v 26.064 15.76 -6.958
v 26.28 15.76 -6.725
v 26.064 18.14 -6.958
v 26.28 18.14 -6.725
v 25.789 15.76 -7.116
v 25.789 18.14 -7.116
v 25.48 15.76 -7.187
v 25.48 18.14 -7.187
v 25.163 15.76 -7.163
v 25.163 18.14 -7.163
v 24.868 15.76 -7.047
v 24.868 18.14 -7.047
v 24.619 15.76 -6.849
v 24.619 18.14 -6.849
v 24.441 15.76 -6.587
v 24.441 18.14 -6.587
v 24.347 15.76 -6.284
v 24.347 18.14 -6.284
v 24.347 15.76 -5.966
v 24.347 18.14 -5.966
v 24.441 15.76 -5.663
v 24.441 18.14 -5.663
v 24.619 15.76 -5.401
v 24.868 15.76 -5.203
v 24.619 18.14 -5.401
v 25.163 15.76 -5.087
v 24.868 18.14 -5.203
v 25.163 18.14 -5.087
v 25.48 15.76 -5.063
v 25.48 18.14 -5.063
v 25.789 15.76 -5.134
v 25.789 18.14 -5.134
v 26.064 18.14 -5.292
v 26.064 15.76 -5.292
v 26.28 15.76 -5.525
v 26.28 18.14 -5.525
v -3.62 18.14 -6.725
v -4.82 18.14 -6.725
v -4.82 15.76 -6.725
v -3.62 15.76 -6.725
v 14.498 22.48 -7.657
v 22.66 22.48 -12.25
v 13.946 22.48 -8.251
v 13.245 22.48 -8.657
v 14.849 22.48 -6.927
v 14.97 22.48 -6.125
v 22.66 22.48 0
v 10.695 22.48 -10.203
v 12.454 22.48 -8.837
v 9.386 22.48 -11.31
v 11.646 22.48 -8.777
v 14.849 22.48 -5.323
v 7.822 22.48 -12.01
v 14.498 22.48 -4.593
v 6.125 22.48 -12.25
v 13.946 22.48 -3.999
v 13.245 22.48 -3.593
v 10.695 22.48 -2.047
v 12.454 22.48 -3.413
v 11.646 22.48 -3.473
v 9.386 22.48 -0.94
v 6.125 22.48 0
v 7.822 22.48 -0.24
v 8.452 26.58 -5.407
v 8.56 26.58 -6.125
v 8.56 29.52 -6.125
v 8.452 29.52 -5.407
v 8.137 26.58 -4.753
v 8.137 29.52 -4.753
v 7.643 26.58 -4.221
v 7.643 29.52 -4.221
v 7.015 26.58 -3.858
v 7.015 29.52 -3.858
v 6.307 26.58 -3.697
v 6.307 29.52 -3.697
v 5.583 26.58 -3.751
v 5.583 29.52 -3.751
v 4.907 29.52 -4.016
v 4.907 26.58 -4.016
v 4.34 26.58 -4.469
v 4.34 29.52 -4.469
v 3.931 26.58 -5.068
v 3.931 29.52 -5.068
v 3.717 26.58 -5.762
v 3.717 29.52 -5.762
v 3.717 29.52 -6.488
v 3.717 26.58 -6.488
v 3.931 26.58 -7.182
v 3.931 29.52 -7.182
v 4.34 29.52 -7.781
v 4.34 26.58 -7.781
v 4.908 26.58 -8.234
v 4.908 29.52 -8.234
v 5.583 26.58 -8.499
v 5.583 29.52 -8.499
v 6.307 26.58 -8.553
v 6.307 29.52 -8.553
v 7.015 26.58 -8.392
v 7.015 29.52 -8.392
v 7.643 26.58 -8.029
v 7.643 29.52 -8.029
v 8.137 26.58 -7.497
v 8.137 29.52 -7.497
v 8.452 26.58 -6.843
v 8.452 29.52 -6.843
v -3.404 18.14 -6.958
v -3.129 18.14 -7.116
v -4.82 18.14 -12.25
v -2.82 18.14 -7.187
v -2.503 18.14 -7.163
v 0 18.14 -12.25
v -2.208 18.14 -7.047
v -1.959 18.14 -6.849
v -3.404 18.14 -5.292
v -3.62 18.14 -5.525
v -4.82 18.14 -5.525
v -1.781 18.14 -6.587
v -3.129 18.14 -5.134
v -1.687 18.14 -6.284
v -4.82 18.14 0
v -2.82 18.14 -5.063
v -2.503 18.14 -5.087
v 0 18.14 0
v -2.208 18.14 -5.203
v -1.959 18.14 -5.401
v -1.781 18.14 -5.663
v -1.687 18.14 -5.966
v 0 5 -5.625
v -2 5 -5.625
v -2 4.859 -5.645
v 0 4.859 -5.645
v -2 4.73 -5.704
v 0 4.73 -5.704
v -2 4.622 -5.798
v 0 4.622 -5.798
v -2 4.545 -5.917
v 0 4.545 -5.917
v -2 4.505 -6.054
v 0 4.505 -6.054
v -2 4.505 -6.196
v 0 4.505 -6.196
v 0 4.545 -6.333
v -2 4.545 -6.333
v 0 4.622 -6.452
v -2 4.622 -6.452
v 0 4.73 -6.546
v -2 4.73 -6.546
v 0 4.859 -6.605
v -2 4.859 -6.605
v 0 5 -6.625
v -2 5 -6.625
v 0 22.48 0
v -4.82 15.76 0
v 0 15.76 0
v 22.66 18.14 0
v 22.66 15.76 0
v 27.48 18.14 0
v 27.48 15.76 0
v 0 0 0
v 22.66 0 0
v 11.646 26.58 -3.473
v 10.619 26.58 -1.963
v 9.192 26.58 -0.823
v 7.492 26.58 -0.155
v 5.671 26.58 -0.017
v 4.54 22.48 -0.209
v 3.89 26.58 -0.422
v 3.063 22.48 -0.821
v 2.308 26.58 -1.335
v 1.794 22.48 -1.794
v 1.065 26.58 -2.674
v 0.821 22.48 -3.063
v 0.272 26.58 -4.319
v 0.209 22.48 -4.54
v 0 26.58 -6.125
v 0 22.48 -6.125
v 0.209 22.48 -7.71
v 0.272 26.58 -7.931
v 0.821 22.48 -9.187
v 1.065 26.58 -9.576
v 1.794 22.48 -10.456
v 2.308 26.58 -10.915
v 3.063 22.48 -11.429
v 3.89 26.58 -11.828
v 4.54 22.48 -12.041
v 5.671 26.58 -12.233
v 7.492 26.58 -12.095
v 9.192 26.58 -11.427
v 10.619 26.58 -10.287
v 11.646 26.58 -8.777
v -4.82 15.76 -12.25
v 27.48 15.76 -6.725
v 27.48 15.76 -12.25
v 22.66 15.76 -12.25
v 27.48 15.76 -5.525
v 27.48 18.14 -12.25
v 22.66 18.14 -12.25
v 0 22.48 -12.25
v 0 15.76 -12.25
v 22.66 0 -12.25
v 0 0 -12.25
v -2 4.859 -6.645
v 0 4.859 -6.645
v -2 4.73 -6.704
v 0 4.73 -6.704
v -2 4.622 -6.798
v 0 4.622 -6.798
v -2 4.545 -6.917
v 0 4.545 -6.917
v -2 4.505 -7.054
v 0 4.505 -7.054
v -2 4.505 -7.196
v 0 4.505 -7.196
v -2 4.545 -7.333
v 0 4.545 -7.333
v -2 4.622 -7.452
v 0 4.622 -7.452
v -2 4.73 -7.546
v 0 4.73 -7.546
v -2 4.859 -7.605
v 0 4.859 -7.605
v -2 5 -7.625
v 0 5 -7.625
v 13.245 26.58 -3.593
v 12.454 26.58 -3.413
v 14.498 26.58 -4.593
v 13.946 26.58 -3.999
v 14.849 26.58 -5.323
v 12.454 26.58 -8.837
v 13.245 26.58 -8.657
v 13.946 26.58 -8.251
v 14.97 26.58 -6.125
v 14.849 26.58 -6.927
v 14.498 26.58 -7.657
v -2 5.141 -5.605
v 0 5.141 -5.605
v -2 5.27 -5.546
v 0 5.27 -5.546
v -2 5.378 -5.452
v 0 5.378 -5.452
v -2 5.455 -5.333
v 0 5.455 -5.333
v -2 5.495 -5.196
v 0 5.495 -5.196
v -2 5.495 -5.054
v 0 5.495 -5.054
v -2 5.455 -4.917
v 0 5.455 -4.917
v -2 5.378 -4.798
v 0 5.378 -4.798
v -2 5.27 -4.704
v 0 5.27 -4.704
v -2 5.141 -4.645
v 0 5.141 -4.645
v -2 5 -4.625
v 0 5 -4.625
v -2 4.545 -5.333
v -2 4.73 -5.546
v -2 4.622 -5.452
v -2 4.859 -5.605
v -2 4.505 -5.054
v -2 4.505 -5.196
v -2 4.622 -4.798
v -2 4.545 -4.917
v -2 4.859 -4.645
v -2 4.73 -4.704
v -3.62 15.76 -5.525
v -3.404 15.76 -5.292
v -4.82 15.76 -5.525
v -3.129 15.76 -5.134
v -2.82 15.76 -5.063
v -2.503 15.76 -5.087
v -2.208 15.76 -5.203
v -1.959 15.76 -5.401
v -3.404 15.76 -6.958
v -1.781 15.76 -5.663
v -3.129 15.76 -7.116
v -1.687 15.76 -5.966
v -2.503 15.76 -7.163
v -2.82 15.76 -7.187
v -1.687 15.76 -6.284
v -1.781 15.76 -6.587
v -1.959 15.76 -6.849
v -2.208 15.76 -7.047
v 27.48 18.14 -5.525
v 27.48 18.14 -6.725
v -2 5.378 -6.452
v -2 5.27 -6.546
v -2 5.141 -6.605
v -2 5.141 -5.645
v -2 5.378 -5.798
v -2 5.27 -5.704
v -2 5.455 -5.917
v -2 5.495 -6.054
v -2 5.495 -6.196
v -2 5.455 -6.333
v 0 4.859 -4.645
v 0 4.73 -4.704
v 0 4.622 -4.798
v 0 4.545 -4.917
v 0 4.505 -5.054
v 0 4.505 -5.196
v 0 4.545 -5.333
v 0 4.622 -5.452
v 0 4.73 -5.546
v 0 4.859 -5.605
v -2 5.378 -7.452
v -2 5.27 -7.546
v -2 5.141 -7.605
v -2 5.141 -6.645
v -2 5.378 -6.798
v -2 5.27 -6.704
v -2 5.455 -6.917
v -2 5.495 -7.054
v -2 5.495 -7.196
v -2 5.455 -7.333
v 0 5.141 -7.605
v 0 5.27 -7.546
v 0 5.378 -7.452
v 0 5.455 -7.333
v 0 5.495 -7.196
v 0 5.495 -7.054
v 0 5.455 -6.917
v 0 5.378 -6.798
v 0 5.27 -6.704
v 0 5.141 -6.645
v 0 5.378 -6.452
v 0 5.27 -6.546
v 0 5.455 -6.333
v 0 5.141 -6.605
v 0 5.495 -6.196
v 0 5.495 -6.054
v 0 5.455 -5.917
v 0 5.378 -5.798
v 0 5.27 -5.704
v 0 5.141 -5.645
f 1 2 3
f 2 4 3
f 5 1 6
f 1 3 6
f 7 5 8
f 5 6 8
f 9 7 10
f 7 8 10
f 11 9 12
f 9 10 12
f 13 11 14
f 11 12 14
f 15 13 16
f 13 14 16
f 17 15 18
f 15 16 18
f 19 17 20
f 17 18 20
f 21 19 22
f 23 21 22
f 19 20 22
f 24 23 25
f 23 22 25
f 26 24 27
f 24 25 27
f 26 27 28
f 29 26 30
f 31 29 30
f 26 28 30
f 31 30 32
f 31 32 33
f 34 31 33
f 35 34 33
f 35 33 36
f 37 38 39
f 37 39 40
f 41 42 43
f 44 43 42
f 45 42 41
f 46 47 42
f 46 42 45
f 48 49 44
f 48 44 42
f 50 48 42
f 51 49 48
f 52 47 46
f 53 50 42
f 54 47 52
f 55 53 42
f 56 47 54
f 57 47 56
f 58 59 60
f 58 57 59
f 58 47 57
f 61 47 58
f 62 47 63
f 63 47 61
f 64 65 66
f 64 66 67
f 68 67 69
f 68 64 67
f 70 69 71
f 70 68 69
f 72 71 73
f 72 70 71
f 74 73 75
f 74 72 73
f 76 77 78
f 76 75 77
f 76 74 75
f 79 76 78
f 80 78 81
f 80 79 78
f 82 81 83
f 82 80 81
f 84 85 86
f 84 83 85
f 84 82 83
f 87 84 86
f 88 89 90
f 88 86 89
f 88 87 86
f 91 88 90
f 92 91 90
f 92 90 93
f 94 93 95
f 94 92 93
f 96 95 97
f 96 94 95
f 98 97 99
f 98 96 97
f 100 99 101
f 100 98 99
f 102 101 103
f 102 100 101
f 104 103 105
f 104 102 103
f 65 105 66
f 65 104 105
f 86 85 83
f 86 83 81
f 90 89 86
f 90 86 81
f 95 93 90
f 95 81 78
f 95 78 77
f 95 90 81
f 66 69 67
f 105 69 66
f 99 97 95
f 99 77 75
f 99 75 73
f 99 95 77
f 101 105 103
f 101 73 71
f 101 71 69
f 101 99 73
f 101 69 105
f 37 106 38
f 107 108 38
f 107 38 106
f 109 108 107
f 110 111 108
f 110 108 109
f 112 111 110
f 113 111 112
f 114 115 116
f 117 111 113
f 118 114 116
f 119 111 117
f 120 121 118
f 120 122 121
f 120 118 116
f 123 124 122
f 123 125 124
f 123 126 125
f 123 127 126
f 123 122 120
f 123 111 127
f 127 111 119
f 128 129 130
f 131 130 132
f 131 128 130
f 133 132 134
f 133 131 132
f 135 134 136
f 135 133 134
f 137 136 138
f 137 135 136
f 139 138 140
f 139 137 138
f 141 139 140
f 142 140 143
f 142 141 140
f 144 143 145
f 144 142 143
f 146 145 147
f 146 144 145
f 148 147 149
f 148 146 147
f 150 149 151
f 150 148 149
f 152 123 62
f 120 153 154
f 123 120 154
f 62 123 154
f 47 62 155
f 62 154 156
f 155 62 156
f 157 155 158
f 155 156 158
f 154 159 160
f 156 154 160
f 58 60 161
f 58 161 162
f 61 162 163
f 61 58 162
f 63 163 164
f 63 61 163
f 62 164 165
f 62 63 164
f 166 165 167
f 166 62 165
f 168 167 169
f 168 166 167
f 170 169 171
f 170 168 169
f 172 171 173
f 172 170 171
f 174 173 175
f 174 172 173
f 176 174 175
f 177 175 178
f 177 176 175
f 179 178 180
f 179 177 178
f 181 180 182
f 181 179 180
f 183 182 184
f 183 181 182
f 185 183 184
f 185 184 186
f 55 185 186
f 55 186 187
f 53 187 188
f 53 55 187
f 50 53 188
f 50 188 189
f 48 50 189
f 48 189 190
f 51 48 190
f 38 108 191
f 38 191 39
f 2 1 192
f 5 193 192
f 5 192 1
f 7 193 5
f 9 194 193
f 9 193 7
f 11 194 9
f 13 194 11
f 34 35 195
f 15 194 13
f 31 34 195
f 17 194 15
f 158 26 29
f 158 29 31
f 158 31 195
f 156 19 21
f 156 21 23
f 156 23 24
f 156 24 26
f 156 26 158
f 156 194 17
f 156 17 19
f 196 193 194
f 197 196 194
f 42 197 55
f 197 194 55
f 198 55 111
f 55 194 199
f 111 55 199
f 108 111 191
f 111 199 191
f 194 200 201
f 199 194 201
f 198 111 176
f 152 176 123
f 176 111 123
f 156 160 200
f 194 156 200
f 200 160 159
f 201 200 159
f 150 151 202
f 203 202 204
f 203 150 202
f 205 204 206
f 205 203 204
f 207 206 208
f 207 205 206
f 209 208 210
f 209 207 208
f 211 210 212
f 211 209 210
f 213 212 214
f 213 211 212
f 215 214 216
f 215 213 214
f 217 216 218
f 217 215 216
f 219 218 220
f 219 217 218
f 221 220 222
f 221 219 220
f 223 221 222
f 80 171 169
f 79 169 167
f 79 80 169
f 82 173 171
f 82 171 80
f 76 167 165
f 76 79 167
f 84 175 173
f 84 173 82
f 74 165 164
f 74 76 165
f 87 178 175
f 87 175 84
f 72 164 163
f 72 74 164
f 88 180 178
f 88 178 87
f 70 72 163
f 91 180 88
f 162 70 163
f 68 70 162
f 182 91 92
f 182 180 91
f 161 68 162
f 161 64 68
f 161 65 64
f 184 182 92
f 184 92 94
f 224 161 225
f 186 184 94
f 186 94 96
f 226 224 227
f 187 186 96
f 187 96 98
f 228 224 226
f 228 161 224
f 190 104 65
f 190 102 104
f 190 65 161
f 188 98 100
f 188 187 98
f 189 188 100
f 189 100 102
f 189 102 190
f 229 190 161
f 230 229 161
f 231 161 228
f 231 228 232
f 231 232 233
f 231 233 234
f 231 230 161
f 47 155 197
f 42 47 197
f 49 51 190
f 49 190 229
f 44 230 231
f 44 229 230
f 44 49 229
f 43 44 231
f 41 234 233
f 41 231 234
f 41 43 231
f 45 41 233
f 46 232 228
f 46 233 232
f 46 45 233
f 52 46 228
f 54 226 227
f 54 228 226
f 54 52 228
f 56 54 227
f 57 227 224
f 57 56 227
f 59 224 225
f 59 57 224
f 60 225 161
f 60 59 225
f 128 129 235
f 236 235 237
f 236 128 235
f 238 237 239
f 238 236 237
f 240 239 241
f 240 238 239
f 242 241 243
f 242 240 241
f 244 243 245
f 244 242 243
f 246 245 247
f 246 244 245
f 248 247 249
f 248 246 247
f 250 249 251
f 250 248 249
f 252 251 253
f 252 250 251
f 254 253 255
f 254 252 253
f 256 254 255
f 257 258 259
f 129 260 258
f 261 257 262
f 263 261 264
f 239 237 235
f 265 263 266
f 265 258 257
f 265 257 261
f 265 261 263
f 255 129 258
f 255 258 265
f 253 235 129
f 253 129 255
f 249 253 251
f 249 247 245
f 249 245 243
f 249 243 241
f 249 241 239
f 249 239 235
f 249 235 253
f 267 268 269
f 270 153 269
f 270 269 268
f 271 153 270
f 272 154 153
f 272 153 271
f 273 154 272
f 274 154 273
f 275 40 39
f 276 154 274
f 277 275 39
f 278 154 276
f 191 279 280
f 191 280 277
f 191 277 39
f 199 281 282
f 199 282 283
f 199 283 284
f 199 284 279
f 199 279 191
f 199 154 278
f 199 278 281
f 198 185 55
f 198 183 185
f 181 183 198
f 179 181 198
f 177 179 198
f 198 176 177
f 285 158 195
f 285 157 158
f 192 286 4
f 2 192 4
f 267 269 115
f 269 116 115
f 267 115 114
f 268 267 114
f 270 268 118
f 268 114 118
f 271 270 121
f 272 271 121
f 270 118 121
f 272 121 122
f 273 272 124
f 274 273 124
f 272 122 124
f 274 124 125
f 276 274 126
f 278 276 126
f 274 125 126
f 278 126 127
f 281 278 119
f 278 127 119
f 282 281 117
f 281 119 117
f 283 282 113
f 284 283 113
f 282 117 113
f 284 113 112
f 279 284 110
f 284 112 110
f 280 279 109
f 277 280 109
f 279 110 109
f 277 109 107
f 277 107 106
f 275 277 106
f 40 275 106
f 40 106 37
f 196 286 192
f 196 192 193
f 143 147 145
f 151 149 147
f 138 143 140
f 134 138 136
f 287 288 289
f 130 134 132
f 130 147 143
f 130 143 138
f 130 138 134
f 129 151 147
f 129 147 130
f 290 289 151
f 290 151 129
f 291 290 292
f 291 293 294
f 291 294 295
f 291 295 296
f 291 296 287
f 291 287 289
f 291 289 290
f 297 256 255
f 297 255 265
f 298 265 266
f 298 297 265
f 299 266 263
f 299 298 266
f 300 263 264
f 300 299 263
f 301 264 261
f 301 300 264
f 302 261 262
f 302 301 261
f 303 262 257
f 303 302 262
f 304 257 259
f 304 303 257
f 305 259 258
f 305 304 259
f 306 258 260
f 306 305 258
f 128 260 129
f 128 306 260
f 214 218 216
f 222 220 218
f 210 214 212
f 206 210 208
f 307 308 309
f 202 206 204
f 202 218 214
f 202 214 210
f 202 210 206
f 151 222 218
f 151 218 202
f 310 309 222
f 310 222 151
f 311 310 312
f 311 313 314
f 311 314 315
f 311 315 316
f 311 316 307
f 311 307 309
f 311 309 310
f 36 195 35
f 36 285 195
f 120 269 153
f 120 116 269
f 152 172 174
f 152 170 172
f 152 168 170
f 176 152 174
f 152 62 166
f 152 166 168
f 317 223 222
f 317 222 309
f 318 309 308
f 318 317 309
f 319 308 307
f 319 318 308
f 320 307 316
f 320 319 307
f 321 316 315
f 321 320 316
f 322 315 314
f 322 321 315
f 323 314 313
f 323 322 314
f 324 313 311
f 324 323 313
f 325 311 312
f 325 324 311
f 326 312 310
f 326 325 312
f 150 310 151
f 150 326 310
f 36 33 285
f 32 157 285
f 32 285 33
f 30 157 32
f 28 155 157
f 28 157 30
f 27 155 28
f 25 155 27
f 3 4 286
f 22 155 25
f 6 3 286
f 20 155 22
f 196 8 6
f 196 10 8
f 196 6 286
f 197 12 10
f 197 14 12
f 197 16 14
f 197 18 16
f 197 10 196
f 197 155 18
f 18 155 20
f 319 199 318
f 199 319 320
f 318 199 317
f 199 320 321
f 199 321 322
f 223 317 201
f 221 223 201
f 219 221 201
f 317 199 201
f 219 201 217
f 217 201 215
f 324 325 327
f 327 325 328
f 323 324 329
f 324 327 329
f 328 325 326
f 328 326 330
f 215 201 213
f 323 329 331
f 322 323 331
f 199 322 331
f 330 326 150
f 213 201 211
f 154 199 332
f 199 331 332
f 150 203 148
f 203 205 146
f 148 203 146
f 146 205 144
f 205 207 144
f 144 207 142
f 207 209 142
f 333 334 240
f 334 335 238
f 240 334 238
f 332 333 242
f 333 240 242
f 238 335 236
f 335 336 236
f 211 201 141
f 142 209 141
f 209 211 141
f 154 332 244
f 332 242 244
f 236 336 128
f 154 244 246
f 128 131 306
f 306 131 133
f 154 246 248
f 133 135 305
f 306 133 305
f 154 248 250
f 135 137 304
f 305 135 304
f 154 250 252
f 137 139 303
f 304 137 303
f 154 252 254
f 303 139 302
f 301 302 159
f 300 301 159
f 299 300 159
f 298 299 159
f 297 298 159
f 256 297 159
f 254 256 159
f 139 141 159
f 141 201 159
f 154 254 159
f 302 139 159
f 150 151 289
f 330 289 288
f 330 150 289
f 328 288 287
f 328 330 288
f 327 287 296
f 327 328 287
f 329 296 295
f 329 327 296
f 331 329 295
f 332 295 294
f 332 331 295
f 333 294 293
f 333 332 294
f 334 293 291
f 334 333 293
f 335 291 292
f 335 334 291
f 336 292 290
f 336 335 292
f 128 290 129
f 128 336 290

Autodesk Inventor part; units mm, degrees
ref_plane "YZ Plane" through (0, 0, 0) normal (1, 0, 0) x (0, 1, 0)
ref_plane "XZ Plane" through (0, 0, 0) normal (0, 1, 0) x (-1, 0, 0)
ref_plane "XY Plane" through (0, 0, 0) normal (0, 0, 1) x (1, 0, 0)
sketch "Sketch1" plane through (0, 0, 0) normal (0, 1, 0) x (-1, 0, 0)
  line L0 (0, 0) -> (-22.66, 0)
  line L1 (-22.66, 0) -> (-22.66, -12.25)
  line L2 (-22.66, -12.25) -> (0, -12.25)
  line L3 (0, -12.25) -> (0, 0)
  dimension "innerLength" = 22.66
  dimension "width" = 12.25
extrude "Extrusion1" add sketch "Sketch1" along normal blind 22.48
sketch "Sketch2" plane through (0, 0, -12.25) normal (-1, 0, 0) x (0, 0, 1)
  line L0 (0, 0) -> (0, 22.48) projected
  line L1 (0, 18.14) -> (12.25, 18.14)
  line L2 (12.25, 18.14) -> (12.25, 15.76)
  line L3 (12.25, 15.76) -> (0, 15.76)
  line L4 (0, 15.76) -> (0, 18.14)
  line L5 (0, 22.48) -> (12.25, 22.48) projected
  line L6 (12.25, 0) -> (12.25, 22.48) projected
  dimension "lipOffsetFromTop" = 4.34
  dimension "lipHeight" = 2.38
extrude "Extrusion2" add sketch "Sketch2" along normal blind 4.82 contours L0 L1 L2 L3
sketch "Sketch3" plane through (22.66, 0, 0) normal (1, 0, 0) x (0, 0, -1)
  line L0 (0, 18.14) -> (12.25, 18.14)
  line L1 (12.25, 18.14) -> (12.25, 15.76)
  line L2 (12.25, 15.76) -> (0, 15.76)
  line L3 (0, 15.76) -> (0, 18.14)
  line L4 (12.25, 0) -> (12.25, 22.48) projected
  line L5 (0, 0) -> (0, 22.48) projected
  line L6 (0, 22.48) -> (12.25, 22.48) projected
  dimension "d8" = 4.34
  dimension "d9" = 2.38
extrude "Extrusion3" add sketch "Sketch3" along normal blind 4.82 contours L0 L1 L2 L3
sketch "Sketch4" plane through (0, 22.48, 0) normal (0, 1, 0) x (1, 0, 0)
  arc A0 (11.646, 8.7771) -> (11.646, 3.4729) centre (6.125, 6.125) ccw
  arc A1 (11.646, 3.4729) -> (11.646, 8.7771) centre (12.25, 6.125) ccw
  line L0 (22.66, 12.25) -> (0, 12.25) projected
  line L1 (0, 12.25) -> (0, 0) projected
  line L2 (0, 0) -> (22.66, 0) projected
  dimension "d12" = 5.44
extrude "Extrusion4" add sketch "Sketch4" along normal blind 4.1 contours A1 A0
sketch "Sketch5" plane through (0, 26.58, 0) normal (0, 1, 0) x (1, 0, 0)
  circle A0 centre (6.125, 6.125) radius 2.435
  arc A1 (11.646, 8.7771) -> (11.646, 3.4729) centre (6.125, 6.125) ccw projected
  point P0 (0, 0)
  dimension "shaftDiameter" = 4.87
extrude "Extrusion5" add sketch "Sketch5" along normal blind 2.94
sketch "Sketch6" plane through (22.66, 18.14, 0) normal (0, 1, 0) x (1, 0, 0)
  arc A0 (3.62, 6.725) -> (3.62, 5.525) centre (2.7401, 6.125) ccw
  line L0 (4.82, 0) -> (4.82, 12.25) projected
  line L1 (4.82, 5.525) -> (3.62, 5.525)
  line L2 (4.82, 6.725) -> (3.62, 6.725)
  line L3 (0, 12.25) -> (4.82, 12.25) projected
  point P0 (-22.66, 0)
  dimension "mountingHoleDiameter" = 2.13
  dimension "d19" = 1.2
  dimension "d20" = 1.2
  dimension "d21" = 0.6
  dimension "d22" = 6.125
  dimension "mountingHoleOffset" = 2.0799
extrude "Extrusion6" cut sketch "Sketch6" against normal through all
sketch "Sketch7" plane through (0, 18.14, 0) normal (0, 1, 0) x (1, 0, 0)
  arc A0 (-3.62, 5.525) -> (-3.62, 6.725) centre (-2.7401, 6.125) ccw
  line L0 (0, 12.25) -> (-4.82, 12.25) projected
  line L1 (-4.82, 5.525) -> (-3.62, 5.525)
  line L2 (-4.82, 6.725) -> (-3.62, 6.725)
  line L3 (-4.82, 0) -> (-4.82, 12.25) projected
  line L4 (-4.82, 6.725) -> (-4.82, 5.525)
  point P0 (0, 0)
  dimension "d27" = 2.13
  dimension "d29" = 6.125
  dimension "d31" = 1.2
  dimension "d32" = 1.2
  dimension "d33" = 0.6
extrude "Extrusion7" cut sketch "Sketch7" against normal through all
sketch "Sketch8" plane through (0, 0, -12.25) normal (-1, 0, 0) x (0, 0, 1)
  circle A0 centre (5.125, 5) radius 0.5
  circle A1 centre (6.125, 5) radius 0.5
  circle A2 centre (7.125, 5) radius 0.5
  line L0 (0, 0) -> (0, 15.76) projected
  line L1 (2.9548, 5) -> (8.7957, 5)
  line L2 (0, 0) -> (12.25, 0) projected
  dimension "d36" = 1
  dimension "d37" = 6.125
  dimension "d38" = 5
extrude "Extrusion8" add sketch "Sketch8" along normal blind 2
equation "\"lipLength\" = -0.5 * innerLength + 0.5 * length"
equation "\"d8\" = lipOffsetFromTop"
equation "\"d9\" = lipHeight"
equation "\"d10\" = lipLength"
equation "\"d20\" = d19"
equation "\"d21\" = 0.5 * d19"
equation "\"d22\" = 0.5 * width"
equation "\"d27\" = mountingHoleDiameter"
equation "\"d29\" = 0.5 * width"
equation "\"d31\" = d19"
equation "\"d32\" = d19"
equation "\"d33\" = 0.5 * d19"
equation "\"d37\" = 0.5 * width"
equation "\"length\" = 32.3"
properties part number "micro-servo"
